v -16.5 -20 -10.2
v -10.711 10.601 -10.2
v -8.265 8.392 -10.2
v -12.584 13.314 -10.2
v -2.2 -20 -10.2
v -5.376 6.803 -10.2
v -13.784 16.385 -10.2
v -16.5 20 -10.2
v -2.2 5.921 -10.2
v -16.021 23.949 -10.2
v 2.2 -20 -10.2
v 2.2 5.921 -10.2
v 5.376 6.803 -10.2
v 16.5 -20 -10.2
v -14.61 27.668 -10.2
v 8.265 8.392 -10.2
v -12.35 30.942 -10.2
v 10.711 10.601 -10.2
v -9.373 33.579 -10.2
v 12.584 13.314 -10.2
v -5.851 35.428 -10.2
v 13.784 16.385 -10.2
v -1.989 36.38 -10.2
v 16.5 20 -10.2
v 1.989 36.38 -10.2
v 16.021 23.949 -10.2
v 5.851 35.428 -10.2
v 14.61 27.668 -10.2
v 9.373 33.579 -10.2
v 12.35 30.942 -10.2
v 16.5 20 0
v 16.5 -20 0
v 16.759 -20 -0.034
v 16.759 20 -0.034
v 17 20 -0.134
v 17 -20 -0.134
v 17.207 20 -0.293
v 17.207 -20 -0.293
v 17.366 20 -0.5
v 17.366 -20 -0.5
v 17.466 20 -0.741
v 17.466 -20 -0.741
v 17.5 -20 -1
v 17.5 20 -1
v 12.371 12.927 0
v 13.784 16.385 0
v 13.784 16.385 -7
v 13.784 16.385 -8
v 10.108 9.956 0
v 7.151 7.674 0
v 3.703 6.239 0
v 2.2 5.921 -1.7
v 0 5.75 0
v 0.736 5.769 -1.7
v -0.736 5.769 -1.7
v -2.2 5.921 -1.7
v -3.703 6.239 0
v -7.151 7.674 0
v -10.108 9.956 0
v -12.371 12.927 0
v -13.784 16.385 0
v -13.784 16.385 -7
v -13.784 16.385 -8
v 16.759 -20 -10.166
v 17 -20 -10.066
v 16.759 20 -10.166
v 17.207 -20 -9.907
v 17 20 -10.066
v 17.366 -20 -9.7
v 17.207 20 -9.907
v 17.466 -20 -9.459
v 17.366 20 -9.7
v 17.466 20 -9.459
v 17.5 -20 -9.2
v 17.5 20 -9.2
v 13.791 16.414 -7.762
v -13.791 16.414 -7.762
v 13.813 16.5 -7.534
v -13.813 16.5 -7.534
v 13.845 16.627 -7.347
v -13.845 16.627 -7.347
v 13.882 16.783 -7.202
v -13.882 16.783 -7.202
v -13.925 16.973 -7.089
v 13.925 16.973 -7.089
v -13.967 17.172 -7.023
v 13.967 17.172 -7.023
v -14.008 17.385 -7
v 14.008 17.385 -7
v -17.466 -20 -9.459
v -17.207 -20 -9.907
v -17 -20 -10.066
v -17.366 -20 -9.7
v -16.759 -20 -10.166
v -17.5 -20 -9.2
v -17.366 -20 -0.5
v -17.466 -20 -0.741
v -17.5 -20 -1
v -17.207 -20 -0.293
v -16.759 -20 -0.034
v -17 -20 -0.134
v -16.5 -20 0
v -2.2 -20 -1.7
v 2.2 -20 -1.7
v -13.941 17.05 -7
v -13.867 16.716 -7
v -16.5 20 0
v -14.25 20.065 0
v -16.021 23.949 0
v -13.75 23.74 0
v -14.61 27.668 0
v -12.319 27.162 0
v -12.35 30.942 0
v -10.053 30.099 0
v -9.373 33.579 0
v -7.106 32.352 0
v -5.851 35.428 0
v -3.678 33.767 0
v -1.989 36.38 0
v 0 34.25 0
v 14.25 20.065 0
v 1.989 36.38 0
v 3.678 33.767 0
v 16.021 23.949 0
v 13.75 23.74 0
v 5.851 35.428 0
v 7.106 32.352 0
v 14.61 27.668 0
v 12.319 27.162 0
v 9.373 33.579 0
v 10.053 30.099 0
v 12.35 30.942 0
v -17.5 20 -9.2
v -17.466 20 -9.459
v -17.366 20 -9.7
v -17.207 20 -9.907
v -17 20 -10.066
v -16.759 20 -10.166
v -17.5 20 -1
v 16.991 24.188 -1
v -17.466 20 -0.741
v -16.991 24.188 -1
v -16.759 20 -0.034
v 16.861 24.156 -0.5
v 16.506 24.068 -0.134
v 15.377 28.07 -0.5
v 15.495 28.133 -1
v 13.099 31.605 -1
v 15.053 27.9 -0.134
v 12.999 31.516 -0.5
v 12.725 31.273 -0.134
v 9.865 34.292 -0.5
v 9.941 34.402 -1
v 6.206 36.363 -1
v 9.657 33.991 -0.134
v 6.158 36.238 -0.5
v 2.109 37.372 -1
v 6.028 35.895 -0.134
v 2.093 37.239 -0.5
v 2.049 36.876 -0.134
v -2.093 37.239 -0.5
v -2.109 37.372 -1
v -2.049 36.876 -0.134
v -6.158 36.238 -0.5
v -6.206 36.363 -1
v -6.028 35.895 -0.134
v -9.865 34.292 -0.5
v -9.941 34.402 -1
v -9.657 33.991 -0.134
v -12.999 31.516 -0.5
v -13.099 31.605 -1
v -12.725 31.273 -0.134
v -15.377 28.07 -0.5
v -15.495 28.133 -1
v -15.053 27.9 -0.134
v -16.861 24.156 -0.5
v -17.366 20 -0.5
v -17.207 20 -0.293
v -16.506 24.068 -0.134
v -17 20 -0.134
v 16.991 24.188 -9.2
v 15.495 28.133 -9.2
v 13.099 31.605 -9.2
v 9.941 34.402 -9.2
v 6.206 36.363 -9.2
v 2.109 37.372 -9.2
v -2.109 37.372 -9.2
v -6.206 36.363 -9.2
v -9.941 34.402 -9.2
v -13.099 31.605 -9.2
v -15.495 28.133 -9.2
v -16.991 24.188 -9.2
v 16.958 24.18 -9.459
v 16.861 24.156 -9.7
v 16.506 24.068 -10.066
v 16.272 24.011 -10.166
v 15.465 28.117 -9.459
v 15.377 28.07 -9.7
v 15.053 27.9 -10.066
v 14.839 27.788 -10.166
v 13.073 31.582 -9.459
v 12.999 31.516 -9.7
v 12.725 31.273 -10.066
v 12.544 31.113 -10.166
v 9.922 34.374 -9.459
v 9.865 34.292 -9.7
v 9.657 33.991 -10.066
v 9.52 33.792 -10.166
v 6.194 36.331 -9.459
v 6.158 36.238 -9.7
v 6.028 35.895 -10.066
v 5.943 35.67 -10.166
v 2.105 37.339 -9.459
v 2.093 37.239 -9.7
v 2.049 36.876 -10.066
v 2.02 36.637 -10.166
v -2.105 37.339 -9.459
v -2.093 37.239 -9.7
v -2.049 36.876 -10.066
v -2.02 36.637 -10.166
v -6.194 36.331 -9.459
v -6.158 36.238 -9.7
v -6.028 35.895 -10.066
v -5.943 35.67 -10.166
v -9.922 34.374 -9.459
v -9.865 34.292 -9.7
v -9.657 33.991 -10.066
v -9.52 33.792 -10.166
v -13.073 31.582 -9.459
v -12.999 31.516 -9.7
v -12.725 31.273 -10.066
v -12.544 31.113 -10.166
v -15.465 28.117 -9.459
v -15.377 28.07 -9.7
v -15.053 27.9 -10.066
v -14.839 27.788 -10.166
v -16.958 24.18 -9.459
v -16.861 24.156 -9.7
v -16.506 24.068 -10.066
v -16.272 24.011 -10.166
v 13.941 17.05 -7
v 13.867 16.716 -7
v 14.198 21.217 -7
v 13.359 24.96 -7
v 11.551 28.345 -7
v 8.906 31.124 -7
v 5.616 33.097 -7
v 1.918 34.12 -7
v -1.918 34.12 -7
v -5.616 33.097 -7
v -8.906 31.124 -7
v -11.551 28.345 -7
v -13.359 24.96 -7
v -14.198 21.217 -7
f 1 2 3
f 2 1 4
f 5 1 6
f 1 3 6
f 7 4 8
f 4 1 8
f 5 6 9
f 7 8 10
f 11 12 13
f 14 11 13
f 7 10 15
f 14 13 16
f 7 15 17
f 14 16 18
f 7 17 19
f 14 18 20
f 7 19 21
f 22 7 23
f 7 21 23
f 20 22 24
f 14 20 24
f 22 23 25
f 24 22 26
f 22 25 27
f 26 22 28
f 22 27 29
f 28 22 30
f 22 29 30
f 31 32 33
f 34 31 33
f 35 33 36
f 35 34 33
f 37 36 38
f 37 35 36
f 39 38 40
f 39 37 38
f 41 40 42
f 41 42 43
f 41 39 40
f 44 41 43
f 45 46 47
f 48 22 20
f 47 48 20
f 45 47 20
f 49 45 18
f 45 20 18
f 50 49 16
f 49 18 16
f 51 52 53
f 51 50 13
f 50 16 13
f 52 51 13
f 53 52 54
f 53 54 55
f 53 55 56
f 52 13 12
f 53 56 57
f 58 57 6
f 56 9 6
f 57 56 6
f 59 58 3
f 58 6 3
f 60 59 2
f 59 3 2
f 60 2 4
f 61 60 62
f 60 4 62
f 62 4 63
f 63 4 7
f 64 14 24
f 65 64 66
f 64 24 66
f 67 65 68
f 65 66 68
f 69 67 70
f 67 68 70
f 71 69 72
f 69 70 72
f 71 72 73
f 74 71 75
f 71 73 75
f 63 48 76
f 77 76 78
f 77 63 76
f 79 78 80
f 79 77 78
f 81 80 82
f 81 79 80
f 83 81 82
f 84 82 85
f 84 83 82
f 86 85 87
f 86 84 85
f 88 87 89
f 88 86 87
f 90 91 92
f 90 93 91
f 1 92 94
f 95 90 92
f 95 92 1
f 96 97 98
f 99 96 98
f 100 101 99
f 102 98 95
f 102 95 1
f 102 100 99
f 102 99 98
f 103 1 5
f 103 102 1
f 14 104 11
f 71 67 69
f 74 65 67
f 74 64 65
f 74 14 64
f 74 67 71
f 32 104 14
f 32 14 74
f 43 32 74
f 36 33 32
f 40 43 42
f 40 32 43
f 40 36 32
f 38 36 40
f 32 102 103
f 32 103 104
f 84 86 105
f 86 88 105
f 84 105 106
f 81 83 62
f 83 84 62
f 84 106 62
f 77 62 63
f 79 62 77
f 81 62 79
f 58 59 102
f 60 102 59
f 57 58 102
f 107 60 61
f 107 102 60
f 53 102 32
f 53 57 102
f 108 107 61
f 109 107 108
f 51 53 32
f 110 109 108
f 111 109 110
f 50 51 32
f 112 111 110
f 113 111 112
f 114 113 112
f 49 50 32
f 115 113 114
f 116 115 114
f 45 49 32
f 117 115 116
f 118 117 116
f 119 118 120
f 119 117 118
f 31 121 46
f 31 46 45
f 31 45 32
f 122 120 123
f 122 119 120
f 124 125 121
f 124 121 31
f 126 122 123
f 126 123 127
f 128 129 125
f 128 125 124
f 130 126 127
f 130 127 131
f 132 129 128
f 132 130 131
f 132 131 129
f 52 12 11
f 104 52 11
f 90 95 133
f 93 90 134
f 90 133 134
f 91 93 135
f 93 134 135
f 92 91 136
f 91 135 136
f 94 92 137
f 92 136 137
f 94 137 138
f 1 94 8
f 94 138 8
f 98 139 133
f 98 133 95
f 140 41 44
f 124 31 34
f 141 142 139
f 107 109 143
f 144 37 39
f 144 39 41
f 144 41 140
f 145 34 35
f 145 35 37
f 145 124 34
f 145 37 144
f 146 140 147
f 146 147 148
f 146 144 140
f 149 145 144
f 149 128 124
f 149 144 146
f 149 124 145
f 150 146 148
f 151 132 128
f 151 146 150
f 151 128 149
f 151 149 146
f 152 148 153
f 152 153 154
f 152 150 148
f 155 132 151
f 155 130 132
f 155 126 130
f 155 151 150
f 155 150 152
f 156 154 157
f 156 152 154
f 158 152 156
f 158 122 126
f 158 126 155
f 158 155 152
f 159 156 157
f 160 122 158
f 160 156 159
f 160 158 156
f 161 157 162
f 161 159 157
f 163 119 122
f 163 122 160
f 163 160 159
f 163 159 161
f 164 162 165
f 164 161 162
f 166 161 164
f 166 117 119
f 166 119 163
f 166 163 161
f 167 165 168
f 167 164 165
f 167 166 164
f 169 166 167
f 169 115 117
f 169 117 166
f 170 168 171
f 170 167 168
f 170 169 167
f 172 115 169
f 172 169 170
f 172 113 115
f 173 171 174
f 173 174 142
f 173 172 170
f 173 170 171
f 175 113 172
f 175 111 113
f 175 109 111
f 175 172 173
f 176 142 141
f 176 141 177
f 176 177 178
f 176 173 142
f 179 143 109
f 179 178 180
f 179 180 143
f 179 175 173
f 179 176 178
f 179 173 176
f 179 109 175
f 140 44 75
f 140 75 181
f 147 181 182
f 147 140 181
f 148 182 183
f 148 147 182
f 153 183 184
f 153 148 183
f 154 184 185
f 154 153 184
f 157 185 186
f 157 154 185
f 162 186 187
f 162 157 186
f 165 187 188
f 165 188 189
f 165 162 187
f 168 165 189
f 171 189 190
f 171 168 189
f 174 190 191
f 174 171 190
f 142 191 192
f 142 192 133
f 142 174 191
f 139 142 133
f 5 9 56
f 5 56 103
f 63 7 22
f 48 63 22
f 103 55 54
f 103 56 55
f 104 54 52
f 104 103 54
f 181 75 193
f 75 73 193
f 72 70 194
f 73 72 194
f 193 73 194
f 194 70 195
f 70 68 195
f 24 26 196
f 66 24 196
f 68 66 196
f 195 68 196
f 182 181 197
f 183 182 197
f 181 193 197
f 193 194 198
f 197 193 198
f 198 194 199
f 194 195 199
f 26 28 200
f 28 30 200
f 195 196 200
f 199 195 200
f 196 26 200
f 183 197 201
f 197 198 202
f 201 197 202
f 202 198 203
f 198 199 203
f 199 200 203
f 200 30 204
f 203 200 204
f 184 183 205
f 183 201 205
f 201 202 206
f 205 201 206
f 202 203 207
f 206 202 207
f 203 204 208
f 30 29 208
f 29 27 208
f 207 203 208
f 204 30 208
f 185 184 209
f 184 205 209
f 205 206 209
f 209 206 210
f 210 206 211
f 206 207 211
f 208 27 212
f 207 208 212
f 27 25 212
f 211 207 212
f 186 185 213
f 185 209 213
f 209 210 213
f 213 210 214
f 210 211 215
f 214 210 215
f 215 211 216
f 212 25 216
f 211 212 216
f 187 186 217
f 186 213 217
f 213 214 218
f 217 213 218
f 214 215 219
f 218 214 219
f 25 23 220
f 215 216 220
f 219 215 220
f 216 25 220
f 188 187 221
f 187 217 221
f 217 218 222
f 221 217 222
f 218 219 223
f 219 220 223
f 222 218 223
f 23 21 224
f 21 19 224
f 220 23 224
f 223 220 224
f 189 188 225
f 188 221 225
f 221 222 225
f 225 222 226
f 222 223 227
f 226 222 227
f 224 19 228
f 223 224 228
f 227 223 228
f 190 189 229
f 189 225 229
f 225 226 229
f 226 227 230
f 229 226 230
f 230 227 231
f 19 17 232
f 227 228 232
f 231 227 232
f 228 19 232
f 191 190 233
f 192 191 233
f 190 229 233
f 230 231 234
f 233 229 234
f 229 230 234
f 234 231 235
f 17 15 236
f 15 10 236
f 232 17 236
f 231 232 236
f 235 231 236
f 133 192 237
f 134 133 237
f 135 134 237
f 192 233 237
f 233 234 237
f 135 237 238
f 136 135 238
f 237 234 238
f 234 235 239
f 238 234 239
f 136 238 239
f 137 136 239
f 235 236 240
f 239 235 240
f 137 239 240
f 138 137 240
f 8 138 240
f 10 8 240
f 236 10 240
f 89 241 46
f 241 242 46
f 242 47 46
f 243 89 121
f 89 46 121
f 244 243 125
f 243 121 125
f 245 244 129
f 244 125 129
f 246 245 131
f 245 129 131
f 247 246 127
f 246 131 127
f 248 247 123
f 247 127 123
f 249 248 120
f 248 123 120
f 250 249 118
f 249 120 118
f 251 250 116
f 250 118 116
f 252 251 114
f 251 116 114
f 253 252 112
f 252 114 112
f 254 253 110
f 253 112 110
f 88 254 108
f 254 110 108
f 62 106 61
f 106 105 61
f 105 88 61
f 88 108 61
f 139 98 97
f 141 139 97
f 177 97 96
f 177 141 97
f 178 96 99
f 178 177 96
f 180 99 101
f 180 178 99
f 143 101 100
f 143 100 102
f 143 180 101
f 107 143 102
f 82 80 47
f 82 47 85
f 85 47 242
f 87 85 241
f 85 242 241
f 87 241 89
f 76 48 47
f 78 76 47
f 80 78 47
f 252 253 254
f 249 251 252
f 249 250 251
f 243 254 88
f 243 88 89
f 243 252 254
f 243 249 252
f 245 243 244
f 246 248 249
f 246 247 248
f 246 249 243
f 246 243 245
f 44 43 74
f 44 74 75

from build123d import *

# Parameters (mm, degrees)
F1_DEPTH     = 10.2
F2_R         = 14.25
F3_DEPTH     = 7
F4_W         = 4.4
F4_H         = 30
F5_DEPTH     = 8.5
F7_DEPTH     = 25
F9_T1_DEPTH  = 42.5
F9_T4_ANGLE  = 180
F9_T6_ANGLE  = 180
F9_T10_DEPTH = 32.5676095837
F9_S11_R     = 14.25
F9_T12_DEPTH = 18


# Not quite as in the source:
# - a fillet or chamfer that OpenCascade refuses, or shapes differently, is made with other operations: its cross-section is extruded or revolved along the edge and cut away or added


with BuildPart() as f1:
    # F0 (on Top) → F1 (new body)
    with BuildSketch(Plane.XY):
        with BuildLine():
            Line((-17.5, 20), (-17.5, -20))
            Line((-17.5, -20), (17.5, -20))
            Line((17.5, -20), (17.5, 20))
            ThreePointArc((17.5, 20), (0, 2.5), (-17.5, 20))
        make_face()
        with BuildLine():
            Line((17.5, 20), (-17.5, 20))
            ThreePointArc((-17.5, 20), (0, 2.5), (17.5, 20))
        make_face()
        with BuildLine():
            ThreePointArc((17.5, 20), (0, 37.5), (-17.5, 20))
            Line((-17.5, 20), (17.5, 20))
        make_face()
    extrude(amount=-F1_DEPTH)


with BuildPart() as f3:
    # F2 (on Top) → F3 (new body)
    with BuildSketch(Plane.XY):
        with Locations((0, 20)):
            Circle(F2_R)
    extrude(amount=-F3_DEPTH)


with BuildPart() as f5:
    # F4 (on face) → F5 (new body)
    with BuildSketch(Plane(origin=(0, 0, -10.2), x_dir=(1, 0, 0), z_dir=(0, 0, -1))):
        with Locations((0, 5)):
            Rectangle(F4_W, F4_H)
    extrude(amount=-F5_DEPTH)


with BuildPart() as f7:
    # F6 (on face) → F7 (new body)
    with BuildSketch(Plane(origin=(0, 0, -10.2), x_dir=(1, 0, 0), z_dir=(0, 0, -1))):
        with BuildLine():
            Line((-13.7838047919, -16.3848616264), (13.7838047919, -16.3848616264))
            ThreePointArc((13.7838047919, -16.3848616264), (0, -5.75), (-13.7838047919, -16.3848616264))
        make_face()
    extrude(amount=-F7_DEPTH)


with BuildPart() as f1_1:
    add(f1.part)

    # F8: cut F7, F5, F3
    add(f7.part, mode=Mode.SUBTRACT)
    add(f5.part, mode=Mode.SUBTRACT)
    add(f3.part, mode=Mode.SUBTRACT)

    # F9: fillet of radius 1 on 3 edges, made by hand

    # F9_s2 → F9_t1 (cut)
    with BuildSketch(Plane.XZ.offset(-20)):
        with BuildLine():
            ThreePointArc((16.5, -10.2), (17.2071067812, -9.9071067812), (17.5, -9.2))
            Line((17.5, -9.2), (17.5, -10.2))
            Line((17.5, -10.2), (16.5, -10.2))
        make_face()
        with BuildLine():
            ThreePointArc((-17.5, -9.2), (-17.2071067812, -9.9071067812), (-16.5, -10.2))
            Line((-16.5, -10.2), (-17.5, -10.2))
            Line((-17.5, -10.2), (-17.5, -9.2))
        make_face()
        with BuildLine():
            ThreePointArc((16.5, 0), (17.2071067812, -0.2928932188), (17.5, -1))
            Line((17.5, -1), (17.5, 0))
            Line((17.5, 0), (16.5, 0))
        make_face()
        with BuildLine():
            ThreePointArc((-17.5, -1), (-17.2071067812, -0.2928932188), (-16.5, 0))
            Line((-16.5, 0), (-17.5, 0))
            Line((-17.5, 0), (-17.5, -1))
        make_face()
    extrude(amount=F9_T1_DEPTH, mode=Mode.SUBTRACT)

    # F9_s3 → F9_t4 (revolve, cut)
    with BuildSketch(Plane.XZ.offset(-20)):
        with BuildLine():
            ThreePointArc((17.5, -1), (17.2071067812, -0.2928932188), (16.5, 0))
            Line((16.5, 0), (17.5, 0))
            Line((17.5, 0), (17.5, -1))
        make_face()
    revolve(axis=Axis((0, 20, 0), (0, 0, 1)), revolution_arc=F9_T4_ANGLE, mode=Mode.SUBTRACT)

    # F9_s5 → F9_t6 (revolve, cut)
    with BuildSketch(Plane.XZ.offset(-20)):
        with BuildLine():
            ThreePointArc((17.5, -9.2), (17.2071067812, -9.9071067812), (16.5, -10.2))
            Line((16.5, -10.2), (17.5, -10.2))
            Line((17.5, -10.2), (17.5, -9.2))
        make_face()
    revolve(axis=Axis((0, 20, -10.2), (0, 0, 1)), revolution_arc=F9_T6_ANGLE, mode=Mode.SUBTRACT)


with BuildPart() as f9_tool8:
    # F9_s9 → F9_t10 (new body)
    with BuildSketch(Plane.YZ.offset(-16.2838047919)):
        with BuildLine():
            ThreePointArc((16.3848616264, -8), (16.6777548452, -7.2928932188), (17.3848616264, -7))
            Line((17.3848616264, -7), (16.3848616264, -7))
            Line((16.3848616264, -7), (16.3848616264, -8))
        make_face()
    extrude(amount=F9_T10_DEPTH)

    # F9_s11 → F9_t12 (intersect, symmetric)
    with BuildSketch(Plane.XY.offset(-7.5)):
        with Locations((0, 20)):
            Circle(F9_S11_R)
    extrude(amount=F9_T12_DEPTH, both=True, mode=Mode.INTERSECT)


with BuildPart() as f1_2:
    add(f1_1.part)

    # F9_t7: cut F9_tool8
    add(f9_tool8.part, mode=Mode.SUBTRACT)


solid = f1_2.part
